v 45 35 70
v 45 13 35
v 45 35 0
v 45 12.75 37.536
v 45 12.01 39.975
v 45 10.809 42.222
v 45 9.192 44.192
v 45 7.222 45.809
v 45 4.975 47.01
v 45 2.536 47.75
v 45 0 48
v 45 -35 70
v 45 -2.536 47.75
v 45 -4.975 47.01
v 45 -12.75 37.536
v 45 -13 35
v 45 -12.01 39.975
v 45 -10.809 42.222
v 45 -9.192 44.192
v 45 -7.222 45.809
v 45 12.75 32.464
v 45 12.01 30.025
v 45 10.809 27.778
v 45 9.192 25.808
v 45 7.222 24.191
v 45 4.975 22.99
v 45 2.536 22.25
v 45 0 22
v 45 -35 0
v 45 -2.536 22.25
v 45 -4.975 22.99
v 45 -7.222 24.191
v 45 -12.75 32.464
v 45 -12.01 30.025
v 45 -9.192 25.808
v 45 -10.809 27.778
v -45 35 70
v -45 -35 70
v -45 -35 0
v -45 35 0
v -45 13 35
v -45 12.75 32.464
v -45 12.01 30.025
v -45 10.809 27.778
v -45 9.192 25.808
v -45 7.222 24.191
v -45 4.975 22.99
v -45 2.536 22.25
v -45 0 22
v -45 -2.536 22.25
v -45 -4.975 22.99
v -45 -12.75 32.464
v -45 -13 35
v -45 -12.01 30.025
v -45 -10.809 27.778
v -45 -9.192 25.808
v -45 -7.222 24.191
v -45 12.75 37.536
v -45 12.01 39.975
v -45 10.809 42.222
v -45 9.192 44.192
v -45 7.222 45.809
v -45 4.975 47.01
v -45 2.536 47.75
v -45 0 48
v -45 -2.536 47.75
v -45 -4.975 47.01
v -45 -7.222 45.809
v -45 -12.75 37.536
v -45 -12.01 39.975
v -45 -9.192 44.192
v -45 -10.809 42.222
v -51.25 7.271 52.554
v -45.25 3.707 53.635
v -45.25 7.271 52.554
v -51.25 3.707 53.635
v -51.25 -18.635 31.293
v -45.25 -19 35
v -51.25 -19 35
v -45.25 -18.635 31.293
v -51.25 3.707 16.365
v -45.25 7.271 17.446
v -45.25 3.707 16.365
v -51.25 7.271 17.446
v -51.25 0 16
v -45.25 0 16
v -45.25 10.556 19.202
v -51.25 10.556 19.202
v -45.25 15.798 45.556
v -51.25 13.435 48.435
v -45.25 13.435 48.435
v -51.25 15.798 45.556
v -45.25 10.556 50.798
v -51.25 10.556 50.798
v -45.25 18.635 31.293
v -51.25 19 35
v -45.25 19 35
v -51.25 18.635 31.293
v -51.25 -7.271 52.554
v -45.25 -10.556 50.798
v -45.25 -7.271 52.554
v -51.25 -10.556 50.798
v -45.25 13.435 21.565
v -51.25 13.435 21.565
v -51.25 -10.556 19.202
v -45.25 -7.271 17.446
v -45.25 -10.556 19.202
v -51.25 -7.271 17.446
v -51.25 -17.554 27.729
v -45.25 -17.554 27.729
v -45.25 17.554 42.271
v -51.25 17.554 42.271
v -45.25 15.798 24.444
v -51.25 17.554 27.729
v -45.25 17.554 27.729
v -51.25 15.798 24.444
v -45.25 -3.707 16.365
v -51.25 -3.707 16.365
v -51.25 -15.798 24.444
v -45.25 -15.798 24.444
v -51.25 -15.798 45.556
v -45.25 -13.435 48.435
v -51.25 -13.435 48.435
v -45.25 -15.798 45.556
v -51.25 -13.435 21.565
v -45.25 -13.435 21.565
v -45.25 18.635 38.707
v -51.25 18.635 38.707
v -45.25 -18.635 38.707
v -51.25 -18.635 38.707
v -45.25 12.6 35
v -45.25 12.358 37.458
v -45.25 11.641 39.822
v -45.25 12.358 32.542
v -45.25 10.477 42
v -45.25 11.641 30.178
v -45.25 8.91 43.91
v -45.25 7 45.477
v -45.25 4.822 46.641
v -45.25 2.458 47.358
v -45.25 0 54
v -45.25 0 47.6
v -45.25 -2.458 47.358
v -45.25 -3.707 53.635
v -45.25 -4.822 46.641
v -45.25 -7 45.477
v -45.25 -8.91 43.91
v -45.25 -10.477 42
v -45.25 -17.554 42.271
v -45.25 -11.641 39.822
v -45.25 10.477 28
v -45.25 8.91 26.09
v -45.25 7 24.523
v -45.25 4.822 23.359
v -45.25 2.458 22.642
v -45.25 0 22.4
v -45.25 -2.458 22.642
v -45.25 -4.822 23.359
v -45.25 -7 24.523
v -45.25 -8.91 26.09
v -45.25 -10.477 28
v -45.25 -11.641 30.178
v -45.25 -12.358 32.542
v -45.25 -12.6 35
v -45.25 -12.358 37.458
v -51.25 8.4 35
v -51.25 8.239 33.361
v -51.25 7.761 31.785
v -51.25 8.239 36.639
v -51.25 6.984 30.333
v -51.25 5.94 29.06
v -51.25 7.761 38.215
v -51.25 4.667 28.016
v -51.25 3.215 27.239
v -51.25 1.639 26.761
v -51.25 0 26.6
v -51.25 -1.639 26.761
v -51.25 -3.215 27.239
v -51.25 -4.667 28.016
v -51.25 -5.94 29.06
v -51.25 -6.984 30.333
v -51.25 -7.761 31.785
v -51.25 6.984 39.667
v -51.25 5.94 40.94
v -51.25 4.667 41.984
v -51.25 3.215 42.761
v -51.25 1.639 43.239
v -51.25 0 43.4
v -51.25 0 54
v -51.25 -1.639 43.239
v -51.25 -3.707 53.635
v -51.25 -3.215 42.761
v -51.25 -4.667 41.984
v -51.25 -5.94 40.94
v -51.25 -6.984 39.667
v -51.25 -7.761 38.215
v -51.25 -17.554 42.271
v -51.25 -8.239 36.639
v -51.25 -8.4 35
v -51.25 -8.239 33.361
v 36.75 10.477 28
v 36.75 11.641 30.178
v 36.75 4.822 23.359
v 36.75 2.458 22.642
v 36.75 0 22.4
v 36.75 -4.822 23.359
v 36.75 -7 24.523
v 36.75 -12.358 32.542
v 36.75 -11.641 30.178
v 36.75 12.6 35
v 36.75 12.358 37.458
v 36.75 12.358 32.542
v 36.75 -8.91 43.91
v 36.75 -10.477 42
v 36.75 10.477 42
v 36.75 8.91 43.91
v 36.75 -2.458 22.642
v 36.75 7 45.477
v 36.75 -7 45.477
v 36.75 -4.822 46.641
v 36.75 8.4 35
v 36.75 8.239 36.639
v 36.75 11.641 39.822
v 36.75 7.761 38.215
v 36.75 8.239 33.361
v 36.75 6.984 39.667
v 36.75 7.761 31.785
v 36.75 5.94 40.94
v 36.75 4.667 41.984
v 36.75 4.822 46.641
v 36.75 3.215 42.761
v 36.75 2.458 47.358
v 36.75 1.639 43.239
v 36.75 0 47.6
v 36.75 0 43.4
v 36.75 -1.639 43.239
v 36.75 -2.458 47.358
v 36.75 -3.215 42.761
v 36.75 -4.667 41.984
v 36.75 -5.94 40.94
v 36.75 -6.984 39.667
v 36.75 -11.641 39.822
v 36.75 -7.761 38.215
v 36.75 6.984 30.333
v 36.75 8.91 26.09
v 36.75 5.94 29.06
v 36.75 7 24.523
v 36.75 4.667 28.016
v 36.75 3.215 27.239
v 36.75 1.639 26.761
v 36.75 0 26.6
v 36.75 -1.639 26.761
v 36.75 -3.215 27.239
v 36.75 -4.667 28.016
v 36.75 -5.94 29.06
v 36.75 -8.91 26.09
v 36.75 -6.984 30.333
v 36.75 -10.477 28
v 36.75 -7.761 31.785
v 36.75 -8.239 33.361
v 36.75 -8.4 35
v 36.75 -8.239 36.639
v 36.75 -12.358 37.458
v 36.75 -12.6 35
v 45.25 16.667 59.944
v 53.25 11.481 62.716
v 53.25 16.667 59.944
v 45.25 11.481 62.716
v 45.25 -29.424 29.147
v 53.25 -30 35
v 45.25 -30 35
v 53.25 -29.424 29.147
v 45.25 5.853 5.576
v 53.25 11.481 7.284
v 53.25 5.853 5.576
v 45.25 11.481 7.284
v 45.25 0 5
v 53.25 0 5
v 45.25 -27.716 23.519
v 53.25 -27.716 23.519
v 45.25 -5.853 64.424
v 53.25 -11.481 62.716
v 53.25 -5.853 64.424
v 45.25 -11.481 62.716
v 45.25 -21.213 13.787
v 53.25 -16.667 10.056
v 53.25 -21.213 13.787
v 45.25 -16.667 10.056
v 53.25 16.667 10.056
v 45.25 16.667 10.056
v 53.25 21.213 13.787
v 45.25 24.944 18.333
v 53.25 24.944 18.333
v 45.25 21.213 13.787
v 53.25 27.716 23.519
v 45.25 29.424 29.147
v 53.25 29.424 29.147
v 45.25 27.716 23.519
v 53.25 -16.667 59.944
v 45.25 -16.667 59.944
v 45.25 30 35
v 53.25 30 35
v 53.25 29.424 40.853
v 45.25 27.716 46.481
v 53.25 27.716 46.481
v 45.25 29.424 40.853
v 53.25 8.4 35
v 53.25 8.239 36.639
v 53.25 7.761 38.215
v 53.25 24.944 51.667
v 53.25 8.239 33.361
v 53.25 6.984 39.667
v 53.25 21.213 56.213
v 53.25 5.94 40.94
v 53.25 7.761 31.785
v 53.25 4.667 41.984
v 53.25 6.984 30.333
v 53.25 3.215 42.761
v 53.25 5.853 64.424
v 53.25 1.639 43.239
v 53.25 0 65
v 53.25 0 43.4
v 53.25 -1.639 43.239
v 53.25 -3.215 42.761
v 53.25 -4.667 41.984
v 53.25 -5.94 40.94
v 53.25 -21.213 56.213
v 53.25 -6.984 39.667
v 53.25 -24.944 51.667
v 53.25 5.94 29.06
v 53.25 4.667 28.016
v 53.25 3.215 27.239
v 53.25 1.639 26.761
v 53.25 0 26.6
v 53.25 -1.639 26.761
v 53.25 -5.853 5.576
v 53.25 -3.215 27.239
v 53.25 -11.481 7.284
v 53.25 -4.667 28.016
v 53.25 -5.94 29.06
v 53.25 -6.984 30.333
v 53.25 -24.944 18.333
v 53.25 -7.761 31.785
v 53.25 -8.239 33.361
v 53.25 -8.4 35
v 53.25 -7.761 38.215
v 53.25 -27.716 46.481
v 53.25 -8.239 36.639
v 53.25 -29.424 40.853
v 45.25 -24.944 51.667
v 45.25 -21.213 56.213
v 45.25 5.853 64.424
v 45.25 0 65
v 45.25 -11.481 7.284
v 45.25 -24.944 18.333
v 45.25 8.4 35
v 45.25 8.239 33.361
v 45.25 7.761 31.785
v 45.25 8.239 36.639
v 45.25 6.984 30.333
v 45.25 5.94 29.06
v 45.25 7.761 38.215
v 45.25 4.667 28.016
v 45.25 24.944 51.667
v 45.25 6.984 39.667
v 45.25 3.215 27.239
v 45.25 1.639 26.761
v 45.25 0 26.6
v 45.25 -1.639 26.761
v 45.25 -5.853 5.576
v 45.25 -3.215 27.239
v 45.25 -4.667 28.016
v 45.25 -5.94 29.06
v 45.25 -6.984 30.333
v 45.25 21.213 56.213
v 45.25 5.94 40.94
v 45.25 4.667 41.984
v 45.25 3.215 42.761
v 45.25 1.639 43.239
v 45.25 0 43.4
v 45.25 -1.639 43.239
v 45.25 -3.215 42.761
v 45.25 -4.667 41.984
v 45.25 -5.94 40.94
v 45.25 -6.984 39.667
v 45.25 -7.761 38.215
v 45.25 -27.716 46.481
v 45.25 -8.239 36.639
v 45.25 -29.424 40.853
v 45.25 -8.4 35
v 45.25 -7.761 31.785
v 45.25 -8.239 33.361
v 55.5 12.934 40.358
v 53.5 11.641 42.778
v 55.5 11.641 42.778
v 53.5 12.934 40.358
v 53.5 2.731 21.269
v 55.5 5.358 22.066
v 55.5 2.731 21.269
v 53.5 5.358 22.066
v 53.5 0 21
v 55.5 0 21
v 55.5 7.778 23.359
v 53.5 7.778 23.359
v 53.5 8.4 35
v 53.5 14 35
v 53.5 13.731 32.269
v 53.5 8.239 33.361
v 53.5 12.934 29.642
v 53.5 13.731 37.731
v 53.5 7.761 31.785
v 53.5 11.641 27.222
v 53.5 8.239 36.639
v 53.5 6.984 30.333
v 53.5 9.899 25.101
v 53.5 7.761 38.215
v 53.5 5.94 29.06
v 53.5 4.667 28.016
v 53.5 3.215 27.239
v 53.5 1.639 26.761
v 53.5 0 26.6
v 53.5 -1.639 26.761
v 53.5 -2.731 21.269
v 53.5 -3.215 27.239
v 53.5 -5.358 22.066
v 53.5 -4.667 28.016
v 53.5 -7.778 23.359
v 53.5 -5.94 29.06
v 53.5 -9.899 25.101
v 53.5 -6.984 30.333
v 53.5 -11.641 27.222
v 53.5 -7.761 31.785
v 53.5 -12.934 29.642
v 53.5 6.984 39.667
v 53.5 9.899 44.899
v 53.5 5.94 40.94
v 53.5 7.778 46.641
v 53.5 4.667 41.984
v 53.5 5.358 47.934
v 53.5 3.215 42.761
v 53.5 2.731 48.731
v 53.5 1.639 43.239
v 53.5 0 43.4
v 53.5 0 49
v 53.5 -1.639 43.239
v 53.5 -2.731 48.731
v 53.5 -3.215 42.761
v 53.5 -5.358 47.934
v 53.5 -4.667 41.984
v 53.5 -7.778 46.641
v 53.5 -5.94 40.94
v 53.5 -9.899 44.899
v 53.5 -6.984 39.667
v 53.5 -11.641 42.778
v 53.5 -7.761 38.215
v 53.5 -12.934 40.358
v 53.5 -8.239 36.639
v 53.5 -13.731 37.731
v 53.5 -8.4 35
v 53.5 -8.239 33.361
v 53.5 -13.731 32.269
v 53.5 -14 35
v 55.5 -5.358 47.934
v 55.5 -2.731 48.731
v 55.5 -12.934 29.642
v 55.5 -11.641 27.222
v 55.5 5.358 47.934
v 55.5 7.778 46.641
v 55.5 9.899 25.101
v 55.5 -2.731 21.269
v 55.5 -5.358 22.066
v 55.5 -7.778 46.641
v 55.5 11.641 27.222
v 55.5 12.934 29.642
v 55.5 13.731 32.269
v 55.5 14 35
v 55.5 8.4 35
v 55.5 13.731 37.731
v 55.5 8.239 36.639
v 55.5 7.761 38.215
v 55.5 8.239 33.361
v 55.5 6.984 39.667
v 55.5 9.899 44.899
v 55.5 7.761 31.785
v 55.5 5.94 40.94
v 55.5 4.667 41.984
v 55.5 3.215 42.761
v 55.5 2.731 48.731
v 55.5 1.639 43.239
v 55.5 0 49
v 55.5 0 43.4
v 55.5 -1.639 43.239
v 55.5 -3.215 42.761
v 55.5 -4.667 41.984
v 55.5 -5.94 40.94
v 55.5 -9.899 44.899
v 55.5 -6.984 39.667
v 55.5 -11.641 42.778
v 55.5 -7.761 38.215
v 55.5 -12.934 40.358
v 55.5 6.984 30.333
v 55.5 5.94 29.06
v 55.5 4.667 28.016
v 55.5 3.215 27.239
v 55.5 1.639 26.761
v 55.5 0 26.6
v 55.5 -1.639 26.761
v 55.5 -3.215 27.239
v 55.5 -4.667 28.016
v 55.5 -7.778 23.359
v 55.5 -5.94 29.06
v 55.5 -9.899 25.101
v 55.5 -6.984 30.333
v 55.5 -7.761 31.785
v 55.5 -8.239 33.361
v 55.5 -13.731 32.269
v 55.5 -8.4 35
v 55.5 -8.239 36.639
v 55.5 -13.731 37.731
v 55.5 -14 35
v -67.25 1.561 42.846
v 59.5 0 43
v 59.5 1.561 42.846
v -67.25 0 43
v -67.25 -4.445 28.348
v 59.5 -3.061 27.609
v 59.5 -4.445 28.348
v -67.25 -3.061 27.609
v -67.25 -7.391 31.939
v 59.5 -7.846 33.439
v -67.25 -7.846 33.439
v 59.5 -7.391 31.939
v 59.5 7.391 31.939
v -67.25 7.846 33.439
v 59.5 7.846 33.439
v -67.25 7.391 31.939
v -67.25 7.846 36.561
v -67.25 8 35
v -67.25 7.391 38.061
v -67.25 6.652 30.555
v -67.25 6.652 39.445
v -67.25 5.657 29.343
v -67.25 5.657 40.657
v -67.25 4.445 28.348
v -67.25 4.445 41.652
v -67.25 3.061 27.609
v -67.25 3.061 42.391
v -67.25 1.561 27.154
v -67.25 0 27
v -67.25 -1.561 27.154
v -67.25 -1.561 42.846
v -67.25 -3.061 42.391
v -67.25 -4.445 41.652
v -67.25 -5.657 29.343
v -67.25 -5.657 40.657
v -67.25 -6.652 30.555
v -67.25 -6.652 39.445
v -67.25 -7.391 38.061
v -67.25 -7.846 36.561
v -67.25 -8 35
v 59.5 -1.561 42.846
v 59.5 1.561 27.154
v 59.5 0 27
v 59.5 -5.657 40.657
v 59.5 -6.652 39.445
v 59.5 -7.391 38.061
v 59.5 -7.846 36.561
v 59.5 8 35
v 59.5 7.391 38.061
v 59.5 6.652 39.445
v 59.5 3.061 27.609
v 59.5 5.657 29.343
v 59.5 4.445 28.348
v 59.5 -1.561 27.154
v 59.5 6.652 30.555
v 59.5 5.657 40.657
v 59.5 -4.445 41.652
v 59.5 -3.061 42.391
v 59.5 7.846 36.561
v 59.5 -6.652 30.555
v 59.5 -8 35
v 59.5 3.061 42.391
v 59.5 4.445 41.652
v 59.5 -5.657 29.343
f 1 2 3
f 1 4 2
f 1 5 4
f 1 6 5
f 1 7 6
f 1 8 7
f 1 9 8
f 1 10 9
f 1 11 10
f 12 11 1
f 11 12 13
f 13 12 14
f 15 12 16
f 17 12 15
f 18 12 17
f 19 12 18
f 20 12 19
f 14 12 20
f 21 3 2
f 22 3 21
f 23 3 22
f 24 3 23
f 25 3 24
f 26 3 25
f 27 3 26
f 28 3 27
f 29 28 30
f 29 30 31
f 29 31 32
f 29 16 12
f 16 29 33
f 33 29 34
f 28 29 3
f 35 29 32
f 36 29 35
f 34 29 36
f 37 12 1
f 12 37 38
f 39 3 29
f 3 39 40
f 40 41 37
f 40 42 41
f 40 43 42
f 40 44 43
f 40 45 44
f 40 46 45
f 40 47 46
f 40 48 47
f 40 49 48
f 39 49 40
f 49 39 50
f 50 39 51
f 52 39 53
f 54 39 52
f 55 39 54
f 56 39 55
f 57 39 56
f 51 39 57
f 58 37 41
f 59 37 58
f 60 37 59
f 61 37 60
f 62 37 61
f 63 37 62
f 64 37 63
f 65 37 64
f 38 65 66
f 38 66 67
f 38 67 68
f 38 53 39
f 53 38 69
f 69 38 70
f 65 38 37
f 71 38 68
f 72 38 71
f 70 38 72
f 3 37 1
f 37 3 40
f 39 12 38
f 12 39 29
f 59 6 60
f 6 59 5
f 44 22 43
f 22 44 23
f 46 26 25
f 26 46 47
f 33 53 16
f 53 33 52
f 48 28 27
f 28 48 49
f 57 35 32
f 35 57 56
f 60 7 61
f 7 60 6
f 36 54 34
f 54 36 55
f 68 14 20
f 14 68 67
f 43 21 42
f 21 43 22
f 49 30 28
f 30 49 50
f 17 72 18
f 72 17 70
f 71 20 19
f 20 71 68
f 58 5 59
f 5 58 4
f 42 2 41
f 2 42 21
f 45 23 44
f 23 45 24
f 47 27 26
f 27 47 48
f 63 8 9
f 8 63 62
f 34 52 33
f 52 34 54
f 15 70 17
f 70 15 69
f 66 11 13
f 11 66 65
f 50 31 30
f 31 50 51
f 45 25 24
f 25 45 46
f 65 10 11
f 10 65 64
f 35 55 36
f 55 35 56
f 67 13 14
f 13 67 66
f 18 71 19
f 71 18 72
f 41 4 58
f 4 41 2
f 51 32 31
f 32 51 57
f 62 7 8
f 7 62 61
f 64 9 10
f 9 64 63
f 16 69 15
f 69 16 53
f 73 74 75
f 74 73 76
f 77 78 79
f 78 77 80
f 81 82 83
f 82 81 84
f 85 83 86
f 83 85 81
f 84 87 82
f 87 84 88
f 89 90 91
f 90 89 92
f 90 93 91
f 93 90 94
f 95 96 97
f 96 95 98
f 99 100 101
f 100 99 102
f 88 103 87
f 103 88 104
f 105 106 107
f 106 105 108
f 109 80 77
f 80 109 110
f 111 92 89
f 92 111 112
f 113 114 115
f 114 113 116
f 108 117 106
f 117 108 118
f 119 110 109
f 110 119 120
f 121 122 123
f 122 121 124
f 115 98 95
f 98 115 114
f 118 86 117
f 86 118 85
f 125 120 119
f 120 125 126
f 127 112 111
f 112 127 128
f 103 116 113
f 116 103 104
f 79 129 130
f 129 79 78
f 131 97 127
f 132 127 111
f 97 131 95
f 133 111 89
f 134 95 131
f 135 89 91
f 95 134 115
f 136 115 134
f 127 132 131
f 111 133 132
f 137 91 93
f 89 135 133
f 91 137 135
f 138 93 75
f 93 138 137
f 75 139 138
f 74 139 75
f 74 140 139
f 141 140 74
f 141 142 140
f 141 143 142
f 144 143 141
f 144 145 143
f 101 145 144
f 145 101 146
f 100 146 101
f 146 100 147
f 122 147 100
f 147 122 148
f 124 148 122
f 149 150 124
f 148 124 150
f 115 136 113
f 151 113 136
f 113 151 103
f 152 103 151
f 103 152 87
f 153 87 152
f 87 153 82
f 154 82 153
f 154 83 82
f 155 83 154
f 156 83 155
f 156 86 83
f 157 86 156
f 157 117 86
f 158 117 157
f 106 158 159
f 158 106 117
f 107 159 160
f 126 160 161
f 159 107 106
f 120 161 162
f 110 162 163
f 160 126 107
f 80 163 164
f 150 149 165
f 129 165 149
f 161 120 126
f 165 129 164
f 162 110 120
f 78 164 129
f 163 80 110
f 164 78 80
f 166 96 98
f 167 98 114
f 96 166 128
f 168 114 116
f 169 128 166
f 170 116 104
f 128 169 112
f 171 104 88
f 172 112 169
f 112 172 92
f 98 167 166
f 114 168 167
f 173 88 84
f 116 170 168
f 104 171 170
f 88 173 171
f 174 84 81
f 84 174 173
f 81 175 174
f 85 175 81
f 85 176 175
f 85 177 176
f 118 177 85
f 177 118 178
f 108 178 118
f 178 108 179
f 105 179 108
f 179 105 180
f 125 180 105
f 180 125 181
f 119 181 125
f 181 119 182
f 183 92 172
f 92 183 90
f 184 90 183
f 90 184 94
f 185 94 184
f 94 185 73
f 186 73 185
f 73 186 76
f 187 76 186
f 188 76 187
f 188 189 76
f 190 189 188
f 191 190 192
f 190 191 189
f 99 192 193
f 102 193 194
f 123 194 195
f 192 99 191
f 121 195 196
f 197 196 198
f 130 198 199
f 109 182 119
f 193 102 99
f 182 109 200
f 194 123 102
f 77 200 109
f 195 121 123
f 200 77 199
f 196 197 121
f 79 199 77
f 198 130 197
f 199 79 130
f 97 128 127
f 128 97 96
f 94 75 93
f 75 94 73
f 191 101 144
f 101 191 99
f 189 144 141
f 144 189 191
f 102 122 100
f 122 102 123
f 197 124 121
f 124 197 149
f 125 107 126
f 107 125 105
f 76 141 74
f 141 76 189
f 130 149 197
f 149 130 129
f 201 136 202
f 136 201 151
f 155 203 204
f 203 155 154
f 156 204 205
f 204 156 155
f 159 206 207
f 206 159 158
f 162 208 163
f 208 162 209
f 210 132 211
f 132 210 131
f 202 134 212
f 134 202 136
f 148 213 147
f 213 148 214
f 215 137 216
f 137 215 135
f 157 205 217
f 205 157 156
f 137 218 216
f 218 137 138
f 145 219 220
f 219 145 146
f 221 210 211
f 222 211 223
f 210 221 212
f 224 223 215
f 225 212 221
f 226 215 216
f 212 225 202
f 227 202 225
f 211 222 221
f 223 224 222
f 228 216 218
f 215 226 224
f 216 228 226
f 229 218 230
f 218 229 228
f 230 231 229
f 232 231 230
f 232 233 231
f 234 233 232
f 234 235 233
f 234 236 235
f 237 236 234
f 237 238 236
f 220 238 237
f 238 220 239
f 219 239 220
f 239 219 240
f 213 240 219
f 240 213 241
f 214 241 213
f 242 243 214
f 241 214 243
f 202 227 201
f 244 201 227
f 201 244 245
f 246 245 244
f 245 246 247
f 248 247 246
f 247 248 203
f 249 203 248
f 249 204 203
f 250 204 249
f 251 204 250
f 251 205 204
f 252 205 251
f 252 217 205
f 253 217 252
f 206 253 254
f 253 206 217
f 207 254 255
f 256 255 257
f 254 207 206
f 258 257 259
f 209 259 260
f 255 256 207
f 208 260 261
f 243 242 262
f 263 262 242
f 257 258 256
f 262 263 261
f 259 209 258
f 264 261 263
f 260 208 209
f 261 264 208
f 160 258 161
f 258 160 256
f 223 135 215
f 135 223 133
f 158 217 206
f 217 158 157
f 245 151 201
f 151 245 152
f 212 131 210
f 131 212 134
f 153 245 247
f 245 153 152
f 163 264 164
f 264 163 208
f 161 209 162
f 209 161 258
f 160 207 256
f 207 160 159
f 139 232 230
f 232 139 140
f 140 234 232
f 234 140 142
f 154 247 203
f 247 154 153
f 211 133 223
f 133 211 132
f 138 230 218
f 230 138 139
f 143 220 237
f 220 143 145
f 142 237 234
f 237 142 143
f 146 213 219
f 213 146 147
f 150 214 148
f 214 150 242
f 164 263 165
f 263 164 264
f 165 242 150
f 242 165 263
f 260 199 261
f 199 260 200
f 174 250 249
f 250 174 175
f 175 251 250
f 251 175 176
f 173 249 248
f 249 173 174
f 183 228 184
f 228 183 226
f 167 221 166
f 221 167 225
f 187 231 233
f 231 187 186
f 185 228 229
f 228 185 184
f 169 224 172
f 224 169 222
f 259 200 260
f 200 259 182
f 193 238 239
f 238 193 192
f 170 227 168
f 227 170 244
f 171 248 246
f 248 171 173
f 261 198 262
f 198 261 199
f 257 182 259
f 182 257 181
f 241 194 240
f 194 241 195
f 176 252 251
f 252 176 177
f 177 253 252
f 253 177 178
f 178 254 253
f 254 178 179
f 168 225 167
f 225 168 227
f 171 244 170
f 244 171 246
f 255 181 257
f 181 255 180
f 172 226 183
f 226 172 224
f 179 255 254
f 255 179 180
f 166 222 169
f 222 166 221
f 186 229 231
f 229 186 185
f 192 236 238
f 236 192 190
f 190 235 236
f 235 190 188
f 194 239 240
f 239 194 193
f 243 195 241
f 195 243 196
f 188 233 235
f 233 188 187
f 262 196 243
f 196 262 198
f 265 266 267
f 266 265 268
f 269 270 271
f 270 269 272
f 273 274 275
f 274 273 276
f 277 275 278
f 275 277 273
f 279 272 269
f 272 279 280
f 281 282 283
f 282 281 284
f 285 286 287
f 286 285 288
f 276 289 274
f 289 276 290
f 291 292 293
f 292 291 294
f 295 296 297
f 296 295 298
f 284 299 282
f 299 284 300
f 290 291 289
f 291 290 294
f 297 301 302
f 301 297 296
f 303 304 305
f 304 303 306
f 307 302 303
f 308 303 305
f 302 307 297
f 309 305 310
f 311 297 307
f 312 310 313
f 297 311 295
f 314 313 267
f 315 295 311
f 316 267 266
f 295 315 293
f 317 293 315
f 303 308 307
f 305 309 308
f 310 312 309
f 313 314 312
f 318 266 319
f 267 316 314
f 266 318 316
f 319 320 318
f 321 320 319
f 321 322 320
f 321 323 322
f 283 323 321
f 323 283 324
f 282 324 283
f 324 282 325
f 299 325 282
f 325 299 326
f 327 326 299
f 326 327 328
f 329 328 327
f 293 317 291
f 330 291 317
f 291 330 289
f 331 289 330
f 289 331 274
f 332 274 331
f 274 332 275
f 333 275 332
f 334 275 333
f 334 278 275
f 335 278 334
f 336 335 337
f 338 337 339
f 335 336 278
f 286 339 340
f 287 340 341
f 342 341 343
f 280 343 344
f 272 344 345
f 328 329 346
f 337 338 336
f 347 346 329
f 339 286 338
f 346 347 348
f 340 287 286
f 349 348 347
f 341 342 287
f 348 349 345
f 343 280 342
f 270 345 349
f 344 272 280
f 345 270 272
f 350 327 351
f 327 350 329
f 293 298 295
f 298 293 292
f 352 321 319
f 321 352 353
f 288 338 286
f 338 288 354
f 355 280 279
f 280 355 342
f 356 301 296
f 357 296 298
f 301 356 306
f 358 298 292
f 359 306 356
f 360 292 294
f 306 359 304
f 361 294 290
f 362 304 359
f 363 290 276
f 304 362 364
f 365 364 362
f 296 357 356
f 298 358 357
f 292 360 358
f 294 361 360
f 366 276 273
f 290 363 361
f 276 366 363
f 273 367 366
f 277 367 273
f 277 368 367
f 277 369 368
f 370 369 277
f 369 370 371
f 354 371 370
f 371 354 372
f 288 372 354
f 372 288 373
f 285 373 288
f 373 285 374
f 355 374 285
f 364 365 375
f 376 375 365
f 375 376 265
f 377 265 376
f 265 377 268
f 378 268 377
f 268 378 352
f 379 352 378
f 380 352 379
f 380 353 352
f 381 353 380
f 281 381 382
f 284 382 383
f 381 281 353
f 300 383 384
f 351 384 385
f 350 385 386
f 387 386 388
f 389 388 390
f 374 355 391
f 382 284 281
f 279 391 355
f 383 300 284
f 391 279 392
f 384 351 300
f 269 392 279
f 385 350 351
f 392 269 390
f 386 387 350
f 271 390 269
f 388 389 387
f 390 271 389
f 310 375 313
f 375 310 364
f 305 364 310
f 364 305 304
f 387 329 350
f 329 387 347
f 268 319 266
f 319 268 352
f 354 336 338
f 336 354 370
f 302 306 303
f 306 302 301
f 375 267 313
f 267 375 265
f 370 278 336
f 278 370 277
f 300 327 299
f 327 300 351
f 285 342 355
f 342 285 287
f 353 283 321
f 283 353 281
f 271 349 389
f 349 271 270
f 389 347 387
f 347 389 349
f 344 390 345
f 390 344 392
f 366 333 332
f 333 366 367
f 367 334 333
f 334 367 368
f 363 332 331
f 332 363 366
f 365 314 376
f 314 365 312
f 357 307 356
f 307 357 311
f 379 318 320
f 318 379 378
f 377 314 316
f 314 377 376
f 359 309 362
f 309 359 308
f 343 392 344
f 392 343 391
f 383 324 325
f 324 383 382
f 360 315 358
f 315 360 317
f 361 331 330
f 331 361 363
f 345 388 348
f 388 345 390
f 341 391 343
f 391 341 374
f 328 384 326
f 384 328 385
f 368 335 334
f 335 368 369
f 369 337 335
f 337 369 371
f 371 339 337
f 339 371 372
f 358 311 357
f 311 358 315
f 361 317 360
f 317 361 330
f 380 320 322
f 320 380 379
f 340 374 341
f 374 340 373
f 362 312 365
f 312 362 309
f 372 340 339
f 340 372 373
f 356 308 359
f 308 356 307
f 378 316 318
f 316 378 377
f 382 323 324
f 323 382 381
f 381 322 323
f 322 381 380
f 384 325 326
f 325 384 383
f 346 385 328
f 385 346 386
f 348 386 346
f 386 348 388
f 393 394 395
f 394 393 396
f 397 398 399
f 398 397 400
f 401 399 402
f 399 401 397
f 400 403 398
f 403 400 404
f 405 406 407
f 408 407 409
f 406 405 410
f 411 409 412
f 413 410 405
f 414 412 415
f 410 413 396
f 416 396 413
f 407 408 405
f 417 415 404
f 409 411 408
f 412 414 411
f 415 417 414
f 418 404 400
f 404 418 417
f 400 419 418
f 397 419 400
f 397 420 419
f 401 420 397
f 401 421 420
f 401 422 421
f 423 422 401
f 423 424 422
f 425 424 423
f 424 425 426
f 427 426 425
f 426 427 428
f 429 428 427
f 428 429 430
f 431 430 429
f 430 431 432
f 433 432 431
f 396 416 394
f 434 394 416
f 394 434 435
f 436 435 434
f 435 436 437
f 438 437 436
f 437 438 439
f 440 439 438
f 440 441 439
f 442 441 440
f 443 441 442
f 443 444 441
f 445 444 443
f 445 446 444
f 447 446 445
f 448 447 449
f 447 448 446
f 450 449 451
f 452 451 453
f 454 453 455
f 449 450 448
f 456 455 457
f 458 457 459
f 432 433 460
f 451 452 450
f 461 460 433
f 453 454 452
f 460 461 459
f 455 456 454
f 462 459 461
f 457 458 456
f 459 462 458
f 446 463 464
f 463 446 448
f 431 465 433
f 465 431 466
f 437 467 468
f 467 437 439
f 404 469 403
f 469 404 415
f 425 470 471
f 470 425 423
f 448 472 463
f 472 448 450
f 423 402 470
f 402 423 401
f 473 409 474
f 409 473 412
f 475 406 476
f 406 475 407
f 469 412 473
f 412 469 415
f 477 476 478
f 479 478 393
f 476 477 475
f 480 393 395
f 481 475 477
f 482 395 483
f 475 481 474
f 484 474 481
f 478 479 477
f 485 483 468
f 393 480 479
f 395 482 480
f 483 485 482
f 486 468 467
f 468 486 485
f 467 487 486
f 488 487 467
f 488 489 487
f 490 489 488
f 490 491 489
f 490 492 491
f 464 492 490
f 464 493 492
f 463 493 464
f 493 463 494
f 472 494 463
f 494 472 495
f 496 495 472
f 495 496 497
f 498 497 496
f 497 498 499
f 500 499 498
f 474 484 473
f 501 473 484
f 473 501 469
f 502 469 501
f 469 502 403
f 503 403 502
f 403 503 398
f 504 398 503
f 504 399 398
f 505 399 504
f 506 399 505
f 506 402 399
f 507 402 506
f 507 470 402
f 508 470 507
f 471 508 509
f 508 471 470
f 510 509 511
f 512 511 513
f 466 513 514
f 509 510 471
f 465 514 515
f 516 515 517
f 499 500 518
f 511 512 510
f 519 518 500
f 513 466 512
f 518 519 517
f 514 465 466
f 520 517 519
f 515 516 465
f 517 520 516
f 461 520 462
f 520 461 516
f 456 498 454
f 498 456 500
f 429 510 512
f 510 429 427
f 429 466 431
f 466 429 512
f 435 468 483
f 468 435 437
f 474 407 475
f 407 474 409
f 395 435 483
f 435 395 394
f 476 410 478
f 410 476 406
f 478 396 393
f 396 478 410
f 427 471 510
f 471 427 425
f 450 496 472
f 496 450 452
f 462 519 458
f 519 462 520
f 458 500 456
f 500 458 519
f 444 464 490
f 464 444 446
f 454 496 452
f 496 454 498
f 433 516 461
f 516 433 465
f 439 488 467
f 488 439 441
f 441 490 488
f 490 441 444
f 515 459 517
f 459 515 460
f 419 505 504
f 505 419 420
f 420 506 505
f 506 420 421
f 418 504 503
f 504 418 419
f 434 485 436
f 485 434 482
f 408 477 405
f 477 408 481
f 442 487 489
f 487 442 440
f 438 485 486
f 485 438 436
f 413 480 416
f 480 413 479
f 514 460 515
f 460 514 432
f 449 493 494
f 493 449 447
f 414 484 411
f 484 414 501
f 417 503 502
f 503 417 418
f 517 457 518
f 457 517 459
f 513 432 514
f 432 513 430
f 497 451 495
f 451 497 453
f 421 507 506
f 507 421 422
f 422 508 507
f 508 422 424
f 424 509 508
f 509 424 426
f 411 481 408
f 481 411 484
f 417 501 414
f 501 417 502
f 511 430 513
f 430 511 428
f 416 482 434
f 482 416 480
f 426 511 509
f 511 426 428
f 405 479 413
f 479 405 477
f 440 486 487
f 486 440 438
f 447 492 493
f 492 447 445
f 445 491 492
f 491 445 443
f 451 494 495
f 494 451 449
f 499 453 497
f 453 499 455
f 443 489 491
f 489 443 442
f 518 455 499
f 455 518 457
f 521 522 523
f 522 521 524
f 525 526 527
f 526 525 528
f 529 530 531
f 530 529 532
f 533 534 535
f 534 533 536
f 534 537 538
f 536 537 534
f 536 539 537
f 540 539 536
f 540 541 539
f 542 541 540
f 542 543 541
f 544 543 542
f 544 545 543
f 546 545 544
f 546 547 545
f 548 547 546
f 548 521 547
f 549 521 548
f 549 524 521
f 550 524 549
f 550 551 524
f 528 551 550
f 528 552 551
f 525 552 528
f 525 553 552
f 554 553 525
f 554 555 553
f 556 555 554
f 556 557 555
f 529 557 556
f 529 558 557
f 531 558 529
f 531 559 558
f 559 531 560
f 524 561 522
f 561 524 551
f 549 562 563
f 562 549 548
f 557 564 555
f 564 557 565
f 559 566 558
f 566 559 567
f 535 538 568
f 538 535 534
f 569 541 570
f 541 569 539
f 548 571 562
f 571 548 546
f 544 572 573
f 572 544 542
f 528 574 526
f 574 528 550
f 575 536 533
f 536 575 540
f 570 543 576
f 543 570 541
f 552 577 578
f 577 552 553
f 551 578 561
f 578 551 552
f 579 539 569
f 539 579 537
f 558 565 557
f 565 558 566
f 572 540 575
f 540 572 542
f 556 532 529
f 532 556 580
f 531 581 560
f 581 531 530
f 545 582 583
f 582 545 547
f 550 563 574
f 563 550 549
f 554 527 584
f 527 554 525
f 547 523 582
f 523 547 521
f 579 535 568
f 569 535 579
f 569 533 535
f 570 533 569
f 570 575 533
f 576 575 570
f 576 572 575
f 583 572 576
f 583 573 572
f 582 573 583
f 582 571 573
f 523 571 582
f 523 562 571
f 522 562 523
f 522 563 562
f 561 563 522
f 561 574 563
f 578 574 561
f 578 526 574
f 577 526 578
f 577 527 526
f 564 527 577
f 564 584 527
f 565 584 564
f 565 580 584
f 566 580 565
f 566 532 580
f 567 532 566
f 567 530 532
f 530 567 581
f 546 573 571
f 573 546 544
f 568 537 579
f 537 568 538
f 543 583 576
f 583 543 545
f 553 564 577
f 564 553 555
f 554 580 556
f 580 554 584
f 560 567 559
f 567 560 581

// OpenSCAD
$fn = 32;

// ------------------------------------------------------------------------
// Bushed housing: 90 x 70 x 70 mm housing, bushing d25.2
// Every part is its own module, assembly() places them once.
// ------------------------------------------------------------------------

// --- part 1 ---
module housing() {
  difference() {
    translate([-45, -35, 0]) cube([90, 70, 70]);
    translate([0, 0, 35]) rotate([0, 90, 0]) cylinder(h = 92, d = 26, center = true);
  }
}

// --- part 2 ---
module bushing() {
  difference() {
    union() {
      cylinder(h = 6, d = 38);
      translate([0, 0, 6]) cylinder(h = 82, d = 25.2);
    }
    translate([0, 0, -1]) cylinder(h = 90, d = 16.8);
  }
}

// --- part 3 ---
module shaft() {
  translate([0, 0, -63.375]) cylinder(h = 126.75, d = 16);
}

// --- part 4 ---
module cover() {
  difference() {
    cylinder(h = 8, d = 60);
    translate([0, 0, -1]) cylinder(h = 10, d = 16.8);
  }
}

// --- part 5 ---
module washer() {
  difference() {
      translate([0, 0, 0]) cylinder(h = 2, d = 28);
      translate([0, 0, -1]) cylinder(h = 4, d = 16.8);
    }
}

// --- assembly ---
module assembly() {
  translate([0, 0, 0]) rotate([0, 0, 0]) housing();
  translate([-51.25, 0, 35]) rotate([0, 90, 0]) bushing();
  translate([-3.875, 0, 35]) rotate([0, 90, 0]) shaft();
  translate([45.25, 0, 35]) rotate([0, 90, 0]) cover();
  translate([53.5, 0, 35]) rotate([0, 90, 0]) washer();
}

assembly();
